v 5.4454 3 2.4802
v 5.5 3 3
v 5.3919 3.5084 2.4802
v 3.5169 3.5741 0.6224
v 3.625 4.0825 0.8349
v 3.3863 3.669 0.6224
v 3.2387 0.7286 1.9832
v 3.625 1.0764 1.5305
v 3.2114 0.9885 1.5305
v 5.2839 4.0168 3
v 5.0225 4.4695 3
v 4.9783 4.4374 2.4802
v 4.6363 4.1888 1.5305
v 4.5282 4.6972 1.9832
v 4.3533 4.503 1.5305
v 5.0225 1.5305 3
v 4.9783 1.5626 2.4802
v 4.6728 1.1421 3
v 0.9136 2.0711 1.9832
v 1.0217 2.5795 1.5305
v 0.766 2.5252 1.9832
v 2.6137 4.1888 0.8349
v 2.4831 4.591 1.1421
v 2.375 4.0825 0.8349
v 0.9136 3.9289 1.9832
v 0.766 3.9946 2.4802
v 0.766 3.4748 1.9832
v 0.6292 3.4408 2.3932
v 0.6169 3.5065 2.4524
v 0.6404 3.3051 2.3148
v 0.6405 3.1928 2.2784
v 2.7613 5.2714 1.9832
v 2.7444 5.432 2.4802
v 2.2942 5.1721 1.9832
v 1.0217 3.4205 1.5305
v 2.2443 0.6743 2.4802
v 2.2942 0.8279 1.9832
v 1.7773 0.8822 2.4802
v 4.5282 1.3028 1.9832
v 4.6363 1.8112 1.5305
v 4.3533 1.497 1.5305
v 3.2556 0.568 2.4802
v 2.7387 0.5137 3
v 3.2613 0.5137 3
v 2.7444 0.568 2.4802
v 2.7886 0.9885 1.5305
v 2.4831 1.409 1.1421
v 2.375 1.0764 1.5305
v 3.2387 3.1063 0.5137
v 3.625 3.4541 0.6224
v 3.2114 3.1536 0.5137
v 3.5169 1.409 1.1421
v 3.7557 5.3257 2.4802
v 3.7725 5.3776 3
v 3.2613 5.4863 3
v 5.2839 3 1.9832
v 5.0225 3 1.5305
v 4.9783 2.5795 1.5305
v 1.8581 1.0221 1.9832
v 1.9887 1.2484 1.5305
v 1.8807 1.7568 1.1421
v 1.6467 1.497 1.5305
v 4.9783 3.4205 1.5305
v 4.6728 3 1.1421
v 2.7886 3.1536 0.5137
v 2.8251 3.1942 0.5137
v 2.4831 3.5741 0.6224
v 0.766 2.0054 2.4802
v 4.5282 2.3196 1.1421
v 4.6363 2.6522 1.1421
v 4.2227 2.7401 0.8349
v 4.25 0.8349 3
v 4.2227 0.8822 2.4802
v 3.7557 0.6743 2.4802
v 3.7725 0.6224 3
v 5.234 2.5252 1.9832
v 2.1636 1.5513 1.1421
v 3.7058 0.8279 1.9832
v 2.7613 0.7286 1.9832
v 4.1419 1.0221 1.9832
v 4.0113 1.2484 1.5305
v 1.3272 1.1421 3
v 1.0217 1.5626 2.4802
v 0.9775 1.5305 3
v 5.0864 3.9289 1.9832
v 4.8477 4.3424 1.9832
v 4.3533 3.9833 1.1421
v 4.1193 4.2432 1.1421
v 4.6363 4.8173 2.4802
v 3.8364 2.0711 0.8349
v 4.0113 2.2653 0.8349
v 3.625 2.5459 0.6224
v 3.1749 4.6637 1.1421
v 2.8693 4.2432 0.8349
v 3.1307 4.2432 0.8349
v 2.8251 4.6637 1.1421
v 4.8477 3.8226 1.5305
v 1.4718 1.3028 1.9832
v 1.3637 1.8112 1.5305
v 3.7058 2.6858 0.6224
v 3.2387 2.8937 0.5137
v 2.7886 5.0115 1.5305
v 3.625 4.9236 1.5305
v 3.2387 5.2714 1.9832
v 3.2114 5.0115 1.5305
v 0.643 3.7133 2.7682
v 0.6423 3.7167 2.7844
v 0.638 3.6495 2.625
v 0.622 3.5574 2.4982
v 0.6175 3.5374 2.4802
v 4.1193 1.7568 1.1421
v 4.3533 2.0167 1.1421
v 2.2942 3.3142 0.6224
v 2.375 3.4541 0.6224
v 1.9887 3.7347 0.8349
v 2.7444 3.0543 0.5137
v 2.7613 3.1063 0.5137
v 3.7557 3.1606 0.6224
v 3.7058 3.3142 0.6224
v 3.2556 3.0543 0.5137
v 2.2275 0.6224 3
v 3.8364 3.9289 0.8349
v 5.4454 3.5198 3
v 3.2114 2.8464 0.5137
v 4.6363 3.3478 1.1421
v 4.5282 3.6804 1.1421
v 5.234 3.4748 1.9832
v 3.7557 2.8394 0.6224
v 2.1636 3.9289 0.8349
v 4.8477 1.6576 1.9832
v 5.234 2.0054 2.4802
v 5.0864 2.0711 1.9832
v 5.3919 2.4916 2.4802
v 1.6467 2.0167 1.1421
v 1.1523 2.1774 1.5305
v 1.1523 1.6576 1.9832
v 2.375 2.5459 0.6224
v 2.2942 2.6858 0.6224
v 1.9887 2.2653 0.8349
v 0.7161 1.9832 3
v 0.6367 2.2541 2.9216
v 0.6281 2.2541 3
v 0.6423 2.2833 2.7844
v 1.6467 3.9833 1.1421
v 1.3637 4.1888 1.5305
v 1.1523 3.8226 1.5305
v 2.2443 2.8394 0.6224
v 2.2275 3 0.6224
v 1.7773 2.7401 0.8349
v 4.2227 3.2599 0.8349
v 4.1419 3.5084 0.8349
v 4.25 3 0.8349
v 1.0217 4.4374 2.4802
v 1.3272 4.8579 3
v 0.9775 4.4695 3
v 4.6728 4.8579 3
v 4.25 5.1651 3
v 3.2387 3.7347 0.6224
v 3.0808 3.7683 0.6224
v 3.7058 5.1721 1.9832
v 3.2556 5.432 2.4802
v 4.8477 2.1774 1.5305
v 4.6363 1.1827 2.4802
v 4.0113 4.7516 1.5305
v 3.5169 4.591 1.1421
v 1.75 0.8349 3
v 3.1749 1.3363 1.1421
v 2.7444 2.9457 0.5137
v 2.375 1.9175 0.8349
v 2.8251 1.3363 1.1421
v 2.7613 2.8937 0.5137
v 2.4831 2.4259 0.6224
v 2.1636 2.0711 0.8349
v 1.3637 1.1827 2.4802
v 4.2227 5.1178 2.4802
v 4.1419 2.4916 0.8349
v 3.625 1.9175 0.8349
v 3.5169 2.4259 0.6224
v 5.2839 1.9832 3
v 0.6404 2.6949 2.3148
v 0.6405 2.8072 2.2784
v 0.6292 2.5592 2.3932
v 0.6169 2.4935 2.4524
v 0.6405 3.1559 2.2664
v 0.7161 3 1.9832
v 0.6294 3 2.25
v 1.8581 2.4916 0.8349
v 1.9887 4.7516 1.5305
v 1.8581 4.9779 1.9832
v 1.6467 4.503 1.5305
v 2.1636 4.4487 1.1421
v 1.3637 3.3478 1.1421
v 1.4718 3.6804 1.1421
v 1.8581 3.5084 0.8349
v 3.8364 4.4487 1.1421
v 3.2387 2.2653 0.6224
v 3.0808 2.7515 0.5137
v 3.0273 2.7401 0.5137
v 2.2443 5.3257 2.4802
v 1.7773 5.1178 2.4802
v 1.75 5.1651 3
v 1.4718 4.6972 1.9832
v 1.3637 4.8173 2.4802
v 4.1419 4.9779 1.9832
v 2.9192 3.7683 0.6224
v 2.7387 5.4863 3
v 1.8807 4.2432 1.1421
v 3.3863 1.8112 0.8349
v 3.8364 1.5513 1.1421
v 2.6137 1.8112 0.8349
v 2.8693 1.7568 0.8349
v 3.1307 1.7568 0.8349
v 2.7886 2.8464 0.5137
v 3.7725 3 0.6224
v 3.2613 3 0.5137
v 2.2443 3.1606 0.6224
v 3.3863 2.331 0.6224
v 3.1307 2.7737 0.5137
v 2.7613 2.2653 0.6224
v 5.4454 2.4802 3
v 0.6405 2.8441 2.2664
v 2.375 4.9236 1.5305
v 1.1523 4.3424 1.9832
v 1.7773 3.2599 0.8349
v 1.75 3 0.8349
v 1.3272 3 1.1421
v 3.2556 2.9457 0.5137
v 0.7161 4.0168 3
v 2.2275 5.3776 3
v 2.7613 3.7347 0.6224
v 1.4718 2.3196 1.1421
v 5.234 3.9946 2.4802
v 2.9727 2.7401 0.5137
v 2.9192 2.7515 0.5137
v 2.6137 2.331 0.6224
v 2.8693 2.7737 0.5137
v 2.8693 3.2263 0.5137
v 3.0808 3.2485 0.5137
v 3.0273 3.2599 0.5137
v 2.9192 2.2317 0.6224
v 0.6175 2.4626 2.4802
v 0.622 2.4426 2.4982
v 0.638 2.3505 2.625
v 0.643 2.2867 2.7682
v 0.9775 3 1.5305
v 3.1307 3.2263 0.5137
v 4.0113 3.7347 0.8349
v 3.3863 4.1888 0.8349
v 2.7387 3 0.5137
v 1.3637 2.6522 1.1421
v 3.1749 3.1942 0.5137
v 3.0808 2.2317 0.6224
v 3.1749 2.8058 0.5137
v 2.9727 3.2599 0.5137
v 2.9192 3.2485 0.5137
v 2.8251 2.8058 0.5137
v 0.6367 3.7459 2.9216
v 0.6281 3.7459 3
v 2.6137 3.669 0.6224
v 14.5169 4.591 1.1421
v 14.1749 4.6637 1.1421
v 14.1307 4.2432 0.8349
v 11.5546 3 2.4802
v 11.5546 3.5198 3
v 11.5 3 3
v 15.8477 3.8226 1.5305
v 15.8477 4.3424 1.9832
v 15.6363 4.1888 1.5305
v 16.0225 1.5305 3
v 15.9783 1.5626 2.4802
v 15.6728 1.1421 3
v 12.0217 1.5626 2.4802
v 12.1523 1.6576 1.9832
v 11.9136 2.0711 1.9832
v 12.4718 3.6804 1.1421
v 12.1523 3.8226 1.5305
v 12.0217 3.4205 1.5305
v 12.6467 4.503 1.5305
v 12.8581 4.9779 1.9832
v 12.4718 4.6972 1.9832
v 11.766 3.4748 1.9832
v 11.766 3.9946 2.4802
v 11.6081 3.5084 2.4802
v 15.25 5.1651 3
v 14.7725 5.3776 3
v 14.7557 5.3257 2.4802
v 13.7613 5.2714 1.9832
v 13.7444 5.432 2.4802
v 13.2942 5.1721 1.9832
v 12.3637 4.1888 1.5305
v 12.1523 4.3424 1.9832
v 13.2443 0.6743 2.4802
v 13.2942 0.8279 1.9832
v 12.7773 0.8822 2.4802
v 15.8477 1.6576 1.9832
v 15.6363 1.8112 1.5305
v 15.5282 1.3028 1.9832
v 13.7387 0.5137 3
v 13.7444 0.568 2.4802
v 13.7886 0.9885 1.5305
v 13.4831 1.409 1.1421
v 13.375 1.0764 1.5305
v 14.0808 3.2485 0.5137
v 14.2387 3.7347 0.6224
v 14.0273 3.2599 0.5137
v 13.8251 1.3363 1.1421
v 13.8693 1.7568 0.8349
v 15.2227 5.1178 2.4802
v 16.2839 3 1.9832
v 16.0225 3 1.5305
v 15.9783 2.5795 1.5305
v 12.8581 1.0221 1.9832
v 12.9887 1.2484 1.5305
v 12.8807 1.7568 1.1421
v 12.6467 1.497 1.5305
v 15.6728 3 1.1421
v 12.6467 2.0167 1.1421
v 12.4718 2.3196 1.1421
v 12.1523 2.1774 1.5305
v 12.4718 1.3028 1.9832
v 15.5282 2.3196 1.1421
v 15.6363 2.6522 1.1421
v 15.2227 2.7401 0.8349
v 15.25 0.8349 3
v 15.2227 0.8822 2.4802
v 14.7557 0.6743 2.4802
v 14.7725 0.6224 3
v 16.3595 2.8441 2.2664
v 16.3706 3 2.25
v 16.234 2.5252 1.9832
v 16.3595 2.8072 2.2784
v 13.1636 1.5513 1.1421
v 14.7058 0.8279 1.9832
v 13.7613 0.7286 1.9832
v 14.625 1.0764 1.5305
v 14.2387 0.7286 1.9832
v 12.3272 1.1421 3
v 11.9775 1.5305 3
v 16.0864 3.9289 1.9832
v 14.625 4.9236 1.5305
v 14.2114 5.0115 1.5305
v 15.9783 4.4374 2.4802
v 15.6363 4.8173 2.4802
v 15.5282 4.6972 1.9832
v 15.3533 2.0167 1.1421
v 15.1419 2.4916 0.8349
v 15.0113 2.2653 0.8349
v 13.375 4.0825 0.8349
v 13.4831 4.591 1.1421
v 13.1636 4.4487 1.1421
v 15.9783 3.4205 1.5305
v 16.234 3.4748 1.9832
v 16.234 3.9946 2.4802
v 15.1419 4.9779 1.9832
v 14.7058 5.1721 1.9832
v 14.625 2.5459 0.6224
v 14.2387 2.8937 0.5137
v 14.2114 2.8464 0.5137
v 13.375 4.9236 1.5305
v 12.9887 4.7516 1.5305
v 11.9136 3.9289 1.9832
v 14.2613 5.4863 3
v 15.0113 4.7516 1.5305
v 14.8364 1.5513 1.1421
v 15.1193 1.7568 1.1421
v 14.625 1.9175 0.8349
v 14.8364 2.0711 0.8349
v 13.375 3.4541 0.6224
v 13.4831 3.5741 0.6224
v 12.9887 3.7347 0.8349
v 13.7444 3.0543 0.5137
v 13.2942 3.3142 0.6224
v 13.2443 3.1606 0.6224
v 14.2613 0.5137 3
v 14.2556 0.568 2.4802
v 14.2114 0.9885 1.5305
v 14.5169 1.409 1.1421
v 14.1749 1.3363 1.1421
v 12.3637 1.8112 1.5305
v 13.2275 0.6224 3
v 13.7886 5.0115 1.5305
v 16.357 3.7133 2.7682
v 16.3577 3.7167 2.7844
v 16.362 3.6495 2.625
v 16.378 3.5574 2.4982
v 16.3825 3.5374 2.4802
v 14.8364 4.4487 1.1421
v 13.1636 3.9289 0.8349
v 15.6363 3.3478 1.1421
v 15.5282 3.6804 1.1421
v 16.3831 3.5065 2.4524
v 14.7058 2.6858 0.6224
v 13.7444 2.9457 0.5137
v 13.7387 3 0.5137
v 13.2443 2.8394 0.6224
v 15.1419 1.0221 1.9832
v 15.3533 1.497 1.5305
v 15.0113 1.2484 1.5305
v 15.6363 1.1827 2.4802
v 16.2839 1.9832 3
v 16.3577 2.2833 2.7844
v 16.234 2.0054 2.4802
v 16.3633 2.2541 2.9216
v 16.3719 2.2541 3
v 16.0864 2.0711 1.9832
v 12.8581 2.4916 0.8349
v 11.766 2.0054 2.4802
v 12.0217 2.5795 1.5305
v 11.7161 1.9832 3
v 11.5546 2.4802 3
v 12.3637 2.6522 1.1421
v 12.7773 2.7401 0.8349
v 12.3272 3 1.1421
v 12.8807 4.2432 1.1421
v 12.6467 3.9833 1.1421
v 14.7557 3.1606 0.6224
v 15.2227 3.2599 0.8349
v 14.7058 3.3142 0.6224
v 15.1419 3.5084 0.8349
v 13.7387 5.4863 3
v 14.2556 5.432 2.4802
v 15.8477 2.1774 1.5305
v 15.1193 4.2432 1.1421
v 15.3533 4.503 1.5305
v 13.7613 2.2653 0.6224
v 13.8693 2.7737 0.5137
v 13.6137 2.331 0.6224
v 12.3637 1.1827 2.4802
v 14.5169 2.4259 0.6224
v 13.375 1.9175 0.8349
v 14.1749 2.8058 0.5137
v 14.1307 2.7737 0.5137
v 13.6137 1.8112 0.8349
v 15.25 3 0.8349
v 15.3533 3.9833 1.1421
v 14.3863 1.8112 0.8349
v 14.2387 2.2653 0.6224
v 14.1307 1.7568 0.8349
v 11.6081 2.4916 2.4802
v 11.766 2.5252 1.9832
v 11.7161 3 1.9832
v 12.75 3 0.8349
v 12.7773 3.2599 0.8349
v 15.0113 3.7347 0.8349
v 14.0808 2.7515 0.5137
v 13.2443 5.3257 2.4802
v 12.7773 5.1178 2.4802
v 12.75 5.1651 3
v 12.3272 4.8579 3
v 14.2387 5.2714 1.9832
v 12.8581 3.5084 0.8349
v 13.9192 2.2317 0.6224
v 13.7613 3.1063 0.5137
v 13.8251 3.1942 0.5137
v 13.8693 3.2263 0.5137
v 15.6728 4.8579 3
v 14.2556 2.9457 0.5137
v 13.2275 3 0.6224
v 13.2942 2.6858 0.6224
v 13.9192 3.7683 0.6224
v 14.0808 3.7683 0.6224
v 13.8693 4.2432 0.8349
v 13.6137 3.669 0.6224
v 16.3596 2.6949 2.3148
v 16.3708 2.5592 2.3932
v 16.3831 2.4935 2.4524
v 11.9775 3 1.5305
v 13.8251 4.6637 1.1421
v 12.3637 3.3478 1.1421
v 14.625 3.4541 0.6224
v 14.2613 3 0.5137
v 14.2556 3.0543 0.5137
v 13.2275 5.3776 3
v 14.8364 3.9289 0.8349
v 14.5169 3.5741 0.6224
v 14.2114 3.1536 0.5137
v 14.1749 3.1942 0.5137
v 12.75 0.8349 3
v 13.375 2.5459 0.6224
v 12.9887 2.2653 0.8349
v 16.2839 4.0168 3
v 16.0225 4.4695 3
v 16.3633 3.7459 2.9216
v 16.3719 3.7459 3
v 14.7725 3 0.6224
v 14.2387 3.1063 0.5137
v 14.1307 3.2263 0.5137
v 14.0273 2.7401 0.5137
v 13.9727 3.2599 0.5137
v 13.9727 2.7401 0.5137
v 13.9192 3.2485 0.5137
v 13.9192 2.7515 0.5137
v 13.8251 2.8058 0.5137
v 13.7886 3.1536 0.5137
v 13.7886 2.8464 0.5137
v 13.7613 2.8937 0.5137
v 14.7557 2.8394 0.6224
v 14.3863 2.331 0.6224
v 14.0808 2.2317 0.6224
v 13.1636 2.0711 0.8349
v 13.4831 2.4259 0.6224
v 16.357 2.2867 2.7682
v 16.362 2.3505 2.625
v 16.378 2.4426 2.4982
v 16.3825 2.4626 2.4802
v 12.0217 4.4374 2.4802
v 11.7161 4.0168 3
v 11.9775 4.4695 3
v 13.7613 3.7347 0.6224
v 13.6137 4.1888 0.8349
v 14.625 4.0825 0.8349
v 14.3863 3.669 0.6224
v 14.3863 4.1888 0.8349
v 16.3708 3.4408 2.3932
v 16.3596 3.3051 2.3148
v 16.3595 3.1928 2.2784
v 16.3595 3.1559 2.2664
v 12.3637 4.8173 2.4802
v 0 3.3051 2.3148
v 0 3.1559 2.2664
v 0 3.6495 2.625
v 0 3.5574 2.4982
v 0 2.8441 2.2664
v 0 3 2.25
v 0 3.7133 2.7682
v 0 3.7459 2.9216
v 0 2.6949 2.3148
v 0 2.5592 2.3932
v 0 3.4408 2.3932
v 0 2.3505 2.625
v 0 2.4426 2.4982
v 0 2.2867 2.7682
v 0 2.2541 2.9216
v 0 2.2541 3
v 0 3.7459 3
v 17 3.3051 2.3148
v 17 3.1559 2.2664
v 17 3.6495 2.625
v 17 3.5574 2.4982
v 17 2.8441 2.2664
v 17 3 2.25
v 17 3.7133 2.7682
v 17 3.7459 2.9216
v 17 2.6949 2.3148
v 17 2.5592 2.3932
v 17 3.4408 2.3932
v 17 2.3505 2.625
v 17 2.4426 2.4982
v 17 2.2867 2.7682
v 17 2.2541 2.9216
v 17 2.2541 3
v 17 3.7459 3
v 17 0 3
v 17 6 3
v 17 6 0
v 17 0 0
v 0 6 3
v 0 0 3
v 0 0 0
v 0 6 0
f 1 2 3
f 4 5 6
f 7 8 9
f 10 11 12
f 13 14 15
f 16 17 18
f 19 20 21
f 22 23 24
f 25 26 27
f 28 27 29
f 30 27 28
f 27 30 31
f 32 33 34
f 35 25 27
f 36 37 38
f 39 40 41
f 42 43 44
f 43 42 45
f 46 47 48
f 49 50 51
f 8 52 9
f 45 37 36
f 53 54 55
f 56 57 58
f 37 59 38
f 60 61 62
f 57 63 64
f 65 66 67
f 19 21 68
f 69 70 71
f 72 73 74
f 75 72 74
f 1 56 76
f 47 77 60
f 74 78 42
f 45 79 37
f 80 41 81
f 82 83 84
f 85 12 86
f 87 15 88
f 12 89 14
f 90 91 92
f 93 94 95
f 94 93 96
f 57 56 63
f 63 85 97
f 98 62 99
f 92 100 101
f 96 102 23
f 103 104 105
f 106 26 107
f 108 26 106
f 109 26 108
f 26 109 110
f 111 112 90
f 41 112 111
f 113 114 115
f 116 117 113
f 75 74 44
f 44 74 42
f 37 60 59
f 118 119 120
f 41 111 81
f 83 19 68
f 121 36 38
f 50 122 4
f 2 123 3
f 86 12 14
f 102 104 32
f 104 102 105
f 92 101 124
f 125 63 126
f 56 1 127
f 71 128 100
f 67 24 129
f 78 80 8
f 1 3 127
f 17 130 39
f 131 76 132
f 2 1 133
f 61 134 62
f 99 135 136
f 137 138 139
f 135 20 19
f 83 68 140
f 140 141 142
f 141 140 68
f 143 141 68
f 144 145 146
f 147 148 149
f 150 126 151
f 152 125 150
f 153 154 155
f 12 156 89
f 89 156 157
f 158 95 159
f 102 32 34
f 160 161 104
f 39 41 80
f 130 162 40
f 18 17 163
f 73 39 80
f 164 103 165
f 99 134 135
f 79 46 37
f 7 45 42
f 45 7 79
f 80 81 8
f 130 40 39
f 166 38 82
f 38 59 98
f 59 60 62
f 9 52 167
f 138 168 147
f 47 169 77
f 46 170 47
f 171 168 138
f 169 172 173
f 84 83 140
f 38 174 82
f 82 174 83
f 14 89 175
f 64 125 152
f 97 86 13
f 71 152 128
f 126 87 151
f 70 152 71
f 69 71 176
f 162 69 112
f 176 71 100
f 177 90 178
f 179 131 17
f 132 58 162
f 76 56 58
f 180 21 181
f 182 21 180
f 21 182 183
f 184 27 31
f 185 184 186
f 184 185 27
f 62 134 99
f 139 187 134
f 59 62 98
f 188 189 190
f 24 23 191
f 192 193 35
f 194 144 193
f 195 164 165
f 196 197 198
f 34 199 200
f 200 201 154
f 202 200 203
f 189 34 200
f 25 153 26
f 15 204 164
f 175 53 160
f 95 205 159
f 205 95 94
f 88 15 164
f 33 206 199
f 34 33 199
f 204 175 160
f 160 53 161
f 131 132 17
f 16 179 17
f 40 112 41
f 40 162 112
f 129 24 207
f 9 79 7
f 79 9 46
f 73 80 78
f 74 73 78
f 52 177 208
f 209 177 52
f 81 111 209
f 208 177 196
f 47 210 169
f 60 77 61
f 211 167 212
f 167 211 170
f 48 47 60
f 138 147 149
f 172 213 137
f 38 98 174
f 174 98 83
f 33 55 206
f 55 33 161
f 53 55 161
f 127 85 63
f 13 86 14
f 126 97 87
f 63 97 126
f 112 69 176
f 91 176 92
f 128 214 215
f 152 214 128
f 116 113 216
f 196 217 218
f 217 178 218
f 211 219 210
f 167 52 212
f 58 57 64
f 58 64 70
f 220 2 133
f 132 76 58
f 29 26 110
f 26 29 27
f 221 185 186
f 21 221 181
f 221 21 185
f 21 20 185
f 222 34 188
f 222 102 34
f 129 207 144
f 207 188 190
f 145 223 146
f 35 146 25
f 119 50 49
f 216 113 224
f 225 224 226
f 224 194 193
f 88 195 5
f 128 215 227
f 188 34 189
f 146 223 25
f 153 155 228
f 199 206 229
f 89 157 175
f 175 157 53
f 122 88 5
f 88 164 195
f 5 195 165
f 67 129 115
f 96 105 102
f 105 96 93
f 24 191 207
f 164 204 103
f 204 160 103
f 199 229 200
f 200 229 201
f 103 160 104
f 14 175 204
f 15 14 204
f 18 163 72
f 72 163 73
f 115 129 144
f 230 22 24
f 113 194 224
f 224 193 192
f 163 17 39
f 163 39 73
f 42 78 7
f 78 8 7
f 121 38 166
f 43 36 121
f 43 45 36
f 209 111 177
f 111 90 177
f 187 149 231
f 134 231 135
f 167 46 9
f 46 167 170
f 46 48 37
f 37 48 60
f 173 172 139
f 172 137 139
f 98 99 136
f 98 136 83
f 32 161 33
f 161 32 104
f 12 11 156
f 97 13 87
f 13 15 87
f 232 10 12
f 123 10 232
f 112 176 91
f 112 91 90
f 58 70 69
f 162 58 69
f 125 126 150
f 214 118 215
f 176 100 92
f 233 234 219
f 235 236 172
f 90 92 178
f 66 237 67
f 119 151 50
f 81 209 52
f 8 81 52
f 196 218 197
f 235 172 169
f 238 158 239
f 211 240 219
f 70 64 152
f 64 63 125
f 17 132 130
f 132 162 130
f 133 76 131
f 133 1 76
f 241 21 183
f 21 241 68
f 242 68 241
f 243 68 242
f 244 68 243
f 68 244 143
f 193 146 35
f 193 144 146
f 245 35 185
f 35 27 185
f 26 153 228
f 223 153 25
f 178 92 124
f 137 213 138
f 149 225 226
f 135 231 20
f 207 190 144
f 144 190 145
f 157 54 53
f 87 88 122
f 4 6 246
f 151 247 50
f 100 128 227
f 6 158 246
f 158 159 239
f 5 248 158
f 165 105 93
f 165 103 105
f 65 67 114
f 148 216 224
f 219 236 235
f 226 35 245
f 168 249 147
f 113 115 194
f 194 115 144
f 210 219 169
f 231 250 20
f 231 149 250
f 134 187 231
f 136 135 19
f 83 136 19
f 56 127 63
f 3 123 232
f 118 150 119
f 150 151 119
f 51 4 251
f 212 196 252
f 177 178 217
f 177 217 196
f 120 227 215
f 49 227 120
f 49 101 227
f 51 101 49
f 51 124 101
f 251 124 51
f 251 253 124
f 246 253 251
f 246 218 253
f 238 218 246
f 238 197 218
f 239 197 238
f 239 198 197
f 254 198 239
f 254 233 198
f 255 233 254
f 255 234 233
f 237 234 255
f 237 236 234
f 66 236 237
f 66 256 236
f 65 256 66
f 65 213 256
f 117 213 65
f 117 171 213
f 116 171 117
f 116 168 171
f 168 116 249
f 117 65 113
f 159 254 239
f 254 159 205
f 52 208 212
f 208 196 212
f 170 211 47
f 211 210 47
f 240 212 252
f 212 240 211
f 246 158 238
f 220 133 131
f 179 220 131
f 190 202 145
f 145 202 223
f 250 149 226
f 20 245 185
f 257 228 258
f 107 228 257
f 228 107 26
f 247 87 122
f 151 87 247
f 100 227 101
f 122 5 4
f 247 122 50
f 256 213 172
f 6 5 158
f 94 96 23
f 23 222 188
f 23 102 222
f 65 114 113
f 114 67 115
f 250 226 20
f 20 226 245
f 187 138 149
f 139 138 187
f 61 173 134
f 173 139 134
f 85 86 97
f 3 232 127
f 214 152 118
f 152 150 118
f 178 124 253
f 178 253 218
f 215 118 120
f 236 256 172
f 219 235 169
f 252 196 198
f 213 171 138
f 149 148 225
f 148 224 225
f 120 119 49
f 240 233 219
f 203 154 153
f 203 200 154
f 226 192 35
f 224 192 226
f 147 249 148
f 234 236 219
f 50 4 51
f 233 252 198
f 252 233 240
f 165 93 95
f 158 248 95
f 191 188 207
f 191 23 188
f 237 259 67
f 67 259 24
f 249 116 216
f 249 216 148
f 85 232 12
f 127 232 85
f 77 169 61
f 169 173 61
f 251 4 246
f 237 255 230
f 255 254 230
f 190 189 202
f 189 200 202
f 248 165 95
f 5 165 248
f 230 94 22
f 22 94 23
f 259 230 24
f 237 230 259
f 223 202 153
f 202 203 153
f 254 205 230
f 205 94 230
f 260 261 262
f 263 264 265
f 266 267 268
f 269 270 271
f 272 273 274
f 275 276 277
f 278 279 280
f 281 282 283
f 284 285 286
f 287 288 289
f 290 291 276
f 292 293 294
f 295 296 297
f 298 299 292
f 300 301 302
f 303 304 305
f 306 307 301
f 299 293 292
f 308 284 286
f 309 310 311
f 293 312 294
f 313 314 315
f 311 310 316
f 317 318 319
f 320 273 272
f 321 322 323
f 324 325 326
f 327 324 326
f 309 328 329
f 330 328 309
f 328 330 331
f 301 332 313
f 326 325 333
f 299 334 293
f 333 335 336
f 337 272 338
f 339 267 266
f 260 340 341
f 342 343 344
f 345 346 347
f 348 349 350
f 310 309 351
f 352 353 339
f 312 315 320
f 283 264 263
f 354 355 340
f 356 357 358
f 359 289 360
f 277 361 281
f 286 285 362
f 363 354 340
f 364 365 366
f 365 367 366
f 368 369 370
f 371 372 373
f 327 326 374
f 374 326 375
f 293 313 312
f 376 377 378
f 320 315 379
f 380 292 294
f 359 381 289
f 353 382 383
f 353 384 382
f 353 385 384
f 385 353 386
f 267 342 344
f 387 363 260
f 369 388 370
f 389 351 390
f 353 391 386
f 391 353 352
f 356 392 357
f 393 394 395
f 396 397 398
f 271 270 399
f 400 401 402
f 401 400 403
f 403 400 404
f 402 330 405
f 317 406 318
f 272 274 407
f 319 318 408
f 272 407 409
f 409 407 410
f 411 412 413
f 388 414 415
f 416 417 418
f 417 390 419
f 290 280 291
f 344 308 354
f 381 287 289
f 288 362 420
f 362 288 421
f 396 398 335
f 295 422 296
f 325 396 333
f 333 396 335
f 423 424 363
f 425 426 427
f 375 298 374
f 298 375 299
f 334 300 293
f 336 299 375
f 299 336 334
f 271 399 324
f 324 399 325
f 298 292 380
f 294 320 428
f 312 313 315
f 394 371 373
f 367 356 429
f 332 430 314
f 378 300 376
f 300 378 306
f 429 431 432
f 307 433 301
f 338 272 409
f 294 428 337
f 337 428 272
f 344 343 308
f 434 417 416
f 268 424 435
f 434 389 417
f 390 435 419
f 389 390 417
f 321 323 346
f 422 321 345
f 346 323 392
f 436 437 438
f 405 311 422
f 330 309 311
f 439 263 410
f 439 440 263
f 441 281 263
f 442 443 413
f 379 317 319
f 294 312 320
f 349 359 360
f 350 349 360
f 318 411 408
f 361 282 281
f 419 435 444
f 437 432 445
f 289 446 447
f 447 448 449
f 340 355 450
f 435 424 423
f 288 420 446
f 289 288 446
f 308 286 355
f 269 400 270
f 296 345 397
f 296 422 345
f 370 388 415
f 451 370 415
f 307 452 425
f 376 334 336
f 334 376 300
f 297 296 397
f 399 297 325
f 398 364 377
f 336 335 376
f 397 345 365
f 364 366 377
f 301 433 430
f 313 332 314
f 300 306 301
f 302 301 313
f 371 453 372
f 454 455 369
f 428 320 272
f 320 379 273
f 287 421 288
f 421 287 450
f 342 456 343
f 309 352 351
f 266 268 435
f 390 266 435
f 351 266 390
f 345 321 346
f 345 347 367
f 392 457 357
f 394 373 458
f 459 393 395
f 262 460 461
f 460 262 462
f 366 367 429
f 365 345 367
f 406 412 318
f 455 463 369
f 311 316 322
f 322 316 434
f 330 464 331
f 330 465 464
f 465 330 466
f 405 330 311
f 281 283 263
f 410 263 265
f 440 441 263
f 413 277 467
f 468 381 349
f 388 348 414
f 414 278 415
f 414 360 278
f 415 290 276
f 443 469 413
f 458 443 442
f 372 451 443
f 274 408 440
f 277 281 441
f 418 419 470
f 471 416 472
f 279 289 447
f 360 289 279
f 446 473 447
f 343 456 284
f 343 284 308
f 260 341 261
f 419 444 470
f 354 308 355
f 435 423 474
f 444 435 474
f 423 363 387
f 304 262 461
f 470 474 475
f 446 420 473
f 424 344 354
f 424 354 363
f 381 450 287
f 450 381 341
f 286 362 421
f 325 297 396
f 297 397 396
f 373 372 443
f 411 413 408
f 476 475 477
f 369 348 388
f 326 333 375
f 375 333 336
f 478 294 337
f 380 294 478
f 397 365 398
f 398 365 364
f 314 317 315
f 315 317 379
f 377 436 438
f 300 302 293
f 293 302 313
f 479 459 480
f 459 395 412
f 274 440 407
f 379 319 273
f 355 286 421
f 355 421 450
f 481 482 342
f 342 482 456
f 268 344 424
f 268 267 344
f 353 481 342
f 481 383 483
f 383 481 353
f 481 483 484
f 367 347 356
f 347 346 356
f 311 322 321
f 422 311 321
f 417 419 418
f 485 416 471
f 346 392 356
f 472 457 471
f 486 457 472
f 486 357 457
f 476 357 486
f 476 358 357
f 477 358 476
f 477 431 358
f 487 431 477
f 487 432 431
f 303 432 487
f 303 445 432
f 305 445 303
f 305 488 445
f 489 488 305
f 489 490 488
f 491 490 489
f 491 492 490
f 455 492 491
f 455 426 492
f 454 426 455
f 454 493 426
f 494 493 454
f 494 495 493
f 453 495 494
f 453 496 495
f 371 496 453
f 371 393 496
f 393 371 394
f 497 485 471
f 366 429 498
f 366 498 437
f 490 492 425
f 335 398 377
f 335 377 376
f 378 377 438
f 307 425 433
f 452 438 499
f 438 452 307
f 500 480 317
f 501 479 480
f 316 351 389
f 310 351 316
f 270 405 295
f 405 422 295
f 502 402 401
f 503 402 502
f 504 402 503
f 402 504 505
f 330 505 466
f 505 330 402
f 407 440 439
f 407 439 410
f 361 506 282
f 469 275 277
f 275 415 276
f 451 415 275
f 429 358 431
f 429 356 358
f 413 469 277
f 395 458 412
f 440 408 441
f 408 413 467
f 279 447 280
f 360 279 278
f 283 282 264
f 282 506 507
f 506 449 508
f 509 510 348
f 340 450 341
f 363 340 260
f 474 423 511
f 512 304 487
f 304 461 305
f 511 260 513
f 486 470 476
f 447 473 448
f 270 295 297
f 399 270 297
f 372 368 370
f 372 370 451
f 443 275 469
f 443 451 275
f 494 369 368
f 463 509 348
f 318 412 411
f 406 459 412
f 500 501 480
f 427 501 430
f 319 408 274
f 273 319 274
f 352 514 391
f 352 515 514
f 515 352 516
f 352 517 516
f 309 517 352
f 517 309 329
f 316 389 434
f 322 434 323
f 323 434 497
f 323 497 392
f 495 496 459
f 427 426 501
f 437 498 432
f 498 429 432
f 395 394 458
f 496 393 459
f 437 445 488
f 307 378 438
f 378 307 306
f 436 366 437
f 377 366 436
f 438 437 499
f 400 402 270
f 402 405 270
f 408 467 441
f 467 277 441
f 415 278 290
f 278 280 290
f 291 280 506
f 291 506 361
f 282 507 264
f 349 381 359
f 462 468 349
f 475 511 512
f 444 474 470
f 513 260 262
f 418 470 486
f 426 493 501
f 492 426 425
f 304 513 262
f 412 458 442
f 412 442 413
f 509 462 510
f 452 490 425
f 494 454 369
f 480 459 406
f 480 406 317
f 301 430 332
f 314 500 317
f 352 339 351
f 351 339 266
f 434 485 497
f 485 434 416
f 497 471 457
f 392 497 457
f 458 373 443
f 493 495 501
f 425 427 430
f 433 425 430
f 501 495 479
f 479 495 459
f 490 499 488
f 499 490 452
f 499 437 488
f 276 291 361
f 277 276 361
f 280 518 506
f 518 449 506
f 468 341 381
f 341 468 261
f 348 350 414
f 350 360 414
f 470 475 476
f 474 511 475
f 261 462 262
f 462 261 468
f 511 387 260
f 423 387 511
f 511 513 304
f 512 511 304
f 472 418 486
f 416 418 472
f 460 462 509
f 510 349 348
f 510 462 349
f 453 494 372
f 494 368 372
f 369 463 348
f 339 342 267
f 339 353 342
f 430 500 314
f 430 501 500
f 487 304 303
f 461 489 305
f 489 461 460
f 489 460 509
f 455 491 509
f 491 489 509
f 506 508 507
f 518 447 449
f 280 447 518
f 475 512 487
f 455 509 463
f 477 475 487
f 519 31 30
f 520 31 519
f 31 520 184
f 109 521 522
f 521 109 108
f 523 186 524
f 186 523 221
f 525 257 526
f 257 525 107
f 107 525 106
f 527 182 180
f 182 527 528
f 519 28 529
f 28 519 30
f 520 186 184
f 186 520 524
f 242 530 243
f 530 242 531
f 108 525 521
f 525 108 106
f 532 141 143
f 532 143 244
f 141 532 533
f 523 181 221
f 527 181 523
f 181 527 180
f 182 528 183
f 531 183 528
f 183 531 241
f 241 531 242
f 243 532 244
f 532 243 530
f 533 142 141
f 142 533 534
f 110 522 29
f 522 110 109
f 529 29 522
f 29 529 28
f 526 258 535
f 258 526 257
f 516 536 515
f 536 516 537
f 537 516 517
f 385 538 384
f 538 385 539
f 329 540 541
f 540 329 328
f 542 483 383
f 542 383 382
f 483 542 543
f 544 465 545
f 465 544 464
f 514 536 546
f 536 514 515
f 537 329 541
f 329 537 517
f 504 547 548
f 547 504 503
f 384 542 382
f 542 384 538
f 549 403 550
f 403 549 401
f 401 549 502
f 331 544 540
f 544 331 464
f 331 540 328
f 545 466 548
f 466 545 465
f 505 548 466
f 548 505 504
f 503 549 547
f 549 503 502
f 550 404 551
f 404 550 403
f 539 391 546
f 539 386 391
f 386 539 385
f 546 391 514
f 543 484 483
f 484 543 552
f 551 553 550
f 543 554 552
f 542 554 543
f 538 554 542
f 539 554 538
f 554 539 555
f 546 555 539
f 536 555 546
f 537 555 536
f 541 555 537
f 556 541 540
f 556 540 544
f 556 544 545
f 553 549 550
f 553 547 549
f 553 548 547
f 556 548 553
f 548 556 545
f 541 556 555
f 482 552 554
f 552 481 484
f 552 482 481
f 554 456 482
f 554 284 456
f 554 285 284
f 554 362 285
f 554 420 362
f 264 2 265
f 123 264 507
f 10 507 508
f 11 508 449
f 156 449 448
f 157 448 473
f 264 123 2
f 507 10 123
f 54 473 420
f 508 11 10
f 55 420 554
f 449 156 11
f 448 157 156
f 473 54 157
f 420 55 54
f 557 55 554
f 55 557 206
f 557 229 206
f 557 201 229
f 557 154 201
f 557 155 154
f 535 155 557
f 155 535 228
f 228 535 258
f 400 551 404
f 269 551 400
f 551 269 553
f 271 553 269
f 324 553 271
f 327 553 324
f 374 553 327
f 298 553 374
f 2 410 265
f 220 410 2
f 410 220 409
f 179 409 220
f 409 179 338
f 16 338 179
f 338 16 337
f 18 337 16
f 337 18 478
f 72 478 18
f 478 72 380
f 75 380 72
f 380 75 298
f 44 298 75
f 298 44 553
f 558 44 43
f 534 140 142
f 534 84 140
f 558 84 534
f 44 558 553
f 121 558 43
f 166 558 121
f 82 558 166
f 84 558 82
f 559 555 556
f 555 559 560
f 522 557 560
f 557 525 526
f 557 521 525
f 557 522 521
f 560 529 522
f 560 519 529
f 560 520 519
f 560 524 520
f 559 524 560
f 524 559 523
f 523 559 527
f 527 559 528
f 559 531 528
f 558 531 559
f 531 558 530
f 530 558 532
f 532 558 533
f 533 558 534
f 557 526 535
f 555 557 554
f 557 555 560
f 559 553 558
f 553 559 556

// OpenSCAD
r=(3+2)/2;

difference()
{
  // main element
  cube([17, 6, 3]);
  // spherical holes
  for(offset = [0.5, 17-2*r-0.5])
    translate([r+offset, 6/2, 3])
      sphere(r=r, $fs=0.001);
  // string entry/exit points
  for(offset = [-0.5, 17-2+0.5])
    translate([offset, 0, 0] + [0, 6/2, 6/2])
      rotate([0, 90, 0])
        cylinder(r=(1+0.5)/2, h=2, $fs=0.001);
}
